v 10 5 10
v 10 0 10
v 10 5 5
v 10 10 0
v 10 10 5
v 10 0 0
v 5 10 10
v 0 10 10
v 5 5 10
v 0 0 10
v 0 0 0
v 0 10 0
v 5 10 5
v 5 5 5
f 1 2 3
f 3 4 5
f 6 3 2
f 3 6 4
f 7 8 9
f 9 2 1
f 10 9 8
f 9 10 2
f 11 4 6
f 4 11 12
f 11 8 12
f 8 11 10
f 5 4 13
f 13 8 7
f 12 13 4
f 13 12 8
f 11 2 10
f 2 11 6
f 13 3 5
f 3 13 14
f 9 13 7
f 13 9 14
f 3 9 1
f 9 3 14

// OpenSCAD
difference() {
	translate (v= [0,0,0]) 	cube (size = 10);
	translate (v= [5,5,5])  cube (size = 10);
}
